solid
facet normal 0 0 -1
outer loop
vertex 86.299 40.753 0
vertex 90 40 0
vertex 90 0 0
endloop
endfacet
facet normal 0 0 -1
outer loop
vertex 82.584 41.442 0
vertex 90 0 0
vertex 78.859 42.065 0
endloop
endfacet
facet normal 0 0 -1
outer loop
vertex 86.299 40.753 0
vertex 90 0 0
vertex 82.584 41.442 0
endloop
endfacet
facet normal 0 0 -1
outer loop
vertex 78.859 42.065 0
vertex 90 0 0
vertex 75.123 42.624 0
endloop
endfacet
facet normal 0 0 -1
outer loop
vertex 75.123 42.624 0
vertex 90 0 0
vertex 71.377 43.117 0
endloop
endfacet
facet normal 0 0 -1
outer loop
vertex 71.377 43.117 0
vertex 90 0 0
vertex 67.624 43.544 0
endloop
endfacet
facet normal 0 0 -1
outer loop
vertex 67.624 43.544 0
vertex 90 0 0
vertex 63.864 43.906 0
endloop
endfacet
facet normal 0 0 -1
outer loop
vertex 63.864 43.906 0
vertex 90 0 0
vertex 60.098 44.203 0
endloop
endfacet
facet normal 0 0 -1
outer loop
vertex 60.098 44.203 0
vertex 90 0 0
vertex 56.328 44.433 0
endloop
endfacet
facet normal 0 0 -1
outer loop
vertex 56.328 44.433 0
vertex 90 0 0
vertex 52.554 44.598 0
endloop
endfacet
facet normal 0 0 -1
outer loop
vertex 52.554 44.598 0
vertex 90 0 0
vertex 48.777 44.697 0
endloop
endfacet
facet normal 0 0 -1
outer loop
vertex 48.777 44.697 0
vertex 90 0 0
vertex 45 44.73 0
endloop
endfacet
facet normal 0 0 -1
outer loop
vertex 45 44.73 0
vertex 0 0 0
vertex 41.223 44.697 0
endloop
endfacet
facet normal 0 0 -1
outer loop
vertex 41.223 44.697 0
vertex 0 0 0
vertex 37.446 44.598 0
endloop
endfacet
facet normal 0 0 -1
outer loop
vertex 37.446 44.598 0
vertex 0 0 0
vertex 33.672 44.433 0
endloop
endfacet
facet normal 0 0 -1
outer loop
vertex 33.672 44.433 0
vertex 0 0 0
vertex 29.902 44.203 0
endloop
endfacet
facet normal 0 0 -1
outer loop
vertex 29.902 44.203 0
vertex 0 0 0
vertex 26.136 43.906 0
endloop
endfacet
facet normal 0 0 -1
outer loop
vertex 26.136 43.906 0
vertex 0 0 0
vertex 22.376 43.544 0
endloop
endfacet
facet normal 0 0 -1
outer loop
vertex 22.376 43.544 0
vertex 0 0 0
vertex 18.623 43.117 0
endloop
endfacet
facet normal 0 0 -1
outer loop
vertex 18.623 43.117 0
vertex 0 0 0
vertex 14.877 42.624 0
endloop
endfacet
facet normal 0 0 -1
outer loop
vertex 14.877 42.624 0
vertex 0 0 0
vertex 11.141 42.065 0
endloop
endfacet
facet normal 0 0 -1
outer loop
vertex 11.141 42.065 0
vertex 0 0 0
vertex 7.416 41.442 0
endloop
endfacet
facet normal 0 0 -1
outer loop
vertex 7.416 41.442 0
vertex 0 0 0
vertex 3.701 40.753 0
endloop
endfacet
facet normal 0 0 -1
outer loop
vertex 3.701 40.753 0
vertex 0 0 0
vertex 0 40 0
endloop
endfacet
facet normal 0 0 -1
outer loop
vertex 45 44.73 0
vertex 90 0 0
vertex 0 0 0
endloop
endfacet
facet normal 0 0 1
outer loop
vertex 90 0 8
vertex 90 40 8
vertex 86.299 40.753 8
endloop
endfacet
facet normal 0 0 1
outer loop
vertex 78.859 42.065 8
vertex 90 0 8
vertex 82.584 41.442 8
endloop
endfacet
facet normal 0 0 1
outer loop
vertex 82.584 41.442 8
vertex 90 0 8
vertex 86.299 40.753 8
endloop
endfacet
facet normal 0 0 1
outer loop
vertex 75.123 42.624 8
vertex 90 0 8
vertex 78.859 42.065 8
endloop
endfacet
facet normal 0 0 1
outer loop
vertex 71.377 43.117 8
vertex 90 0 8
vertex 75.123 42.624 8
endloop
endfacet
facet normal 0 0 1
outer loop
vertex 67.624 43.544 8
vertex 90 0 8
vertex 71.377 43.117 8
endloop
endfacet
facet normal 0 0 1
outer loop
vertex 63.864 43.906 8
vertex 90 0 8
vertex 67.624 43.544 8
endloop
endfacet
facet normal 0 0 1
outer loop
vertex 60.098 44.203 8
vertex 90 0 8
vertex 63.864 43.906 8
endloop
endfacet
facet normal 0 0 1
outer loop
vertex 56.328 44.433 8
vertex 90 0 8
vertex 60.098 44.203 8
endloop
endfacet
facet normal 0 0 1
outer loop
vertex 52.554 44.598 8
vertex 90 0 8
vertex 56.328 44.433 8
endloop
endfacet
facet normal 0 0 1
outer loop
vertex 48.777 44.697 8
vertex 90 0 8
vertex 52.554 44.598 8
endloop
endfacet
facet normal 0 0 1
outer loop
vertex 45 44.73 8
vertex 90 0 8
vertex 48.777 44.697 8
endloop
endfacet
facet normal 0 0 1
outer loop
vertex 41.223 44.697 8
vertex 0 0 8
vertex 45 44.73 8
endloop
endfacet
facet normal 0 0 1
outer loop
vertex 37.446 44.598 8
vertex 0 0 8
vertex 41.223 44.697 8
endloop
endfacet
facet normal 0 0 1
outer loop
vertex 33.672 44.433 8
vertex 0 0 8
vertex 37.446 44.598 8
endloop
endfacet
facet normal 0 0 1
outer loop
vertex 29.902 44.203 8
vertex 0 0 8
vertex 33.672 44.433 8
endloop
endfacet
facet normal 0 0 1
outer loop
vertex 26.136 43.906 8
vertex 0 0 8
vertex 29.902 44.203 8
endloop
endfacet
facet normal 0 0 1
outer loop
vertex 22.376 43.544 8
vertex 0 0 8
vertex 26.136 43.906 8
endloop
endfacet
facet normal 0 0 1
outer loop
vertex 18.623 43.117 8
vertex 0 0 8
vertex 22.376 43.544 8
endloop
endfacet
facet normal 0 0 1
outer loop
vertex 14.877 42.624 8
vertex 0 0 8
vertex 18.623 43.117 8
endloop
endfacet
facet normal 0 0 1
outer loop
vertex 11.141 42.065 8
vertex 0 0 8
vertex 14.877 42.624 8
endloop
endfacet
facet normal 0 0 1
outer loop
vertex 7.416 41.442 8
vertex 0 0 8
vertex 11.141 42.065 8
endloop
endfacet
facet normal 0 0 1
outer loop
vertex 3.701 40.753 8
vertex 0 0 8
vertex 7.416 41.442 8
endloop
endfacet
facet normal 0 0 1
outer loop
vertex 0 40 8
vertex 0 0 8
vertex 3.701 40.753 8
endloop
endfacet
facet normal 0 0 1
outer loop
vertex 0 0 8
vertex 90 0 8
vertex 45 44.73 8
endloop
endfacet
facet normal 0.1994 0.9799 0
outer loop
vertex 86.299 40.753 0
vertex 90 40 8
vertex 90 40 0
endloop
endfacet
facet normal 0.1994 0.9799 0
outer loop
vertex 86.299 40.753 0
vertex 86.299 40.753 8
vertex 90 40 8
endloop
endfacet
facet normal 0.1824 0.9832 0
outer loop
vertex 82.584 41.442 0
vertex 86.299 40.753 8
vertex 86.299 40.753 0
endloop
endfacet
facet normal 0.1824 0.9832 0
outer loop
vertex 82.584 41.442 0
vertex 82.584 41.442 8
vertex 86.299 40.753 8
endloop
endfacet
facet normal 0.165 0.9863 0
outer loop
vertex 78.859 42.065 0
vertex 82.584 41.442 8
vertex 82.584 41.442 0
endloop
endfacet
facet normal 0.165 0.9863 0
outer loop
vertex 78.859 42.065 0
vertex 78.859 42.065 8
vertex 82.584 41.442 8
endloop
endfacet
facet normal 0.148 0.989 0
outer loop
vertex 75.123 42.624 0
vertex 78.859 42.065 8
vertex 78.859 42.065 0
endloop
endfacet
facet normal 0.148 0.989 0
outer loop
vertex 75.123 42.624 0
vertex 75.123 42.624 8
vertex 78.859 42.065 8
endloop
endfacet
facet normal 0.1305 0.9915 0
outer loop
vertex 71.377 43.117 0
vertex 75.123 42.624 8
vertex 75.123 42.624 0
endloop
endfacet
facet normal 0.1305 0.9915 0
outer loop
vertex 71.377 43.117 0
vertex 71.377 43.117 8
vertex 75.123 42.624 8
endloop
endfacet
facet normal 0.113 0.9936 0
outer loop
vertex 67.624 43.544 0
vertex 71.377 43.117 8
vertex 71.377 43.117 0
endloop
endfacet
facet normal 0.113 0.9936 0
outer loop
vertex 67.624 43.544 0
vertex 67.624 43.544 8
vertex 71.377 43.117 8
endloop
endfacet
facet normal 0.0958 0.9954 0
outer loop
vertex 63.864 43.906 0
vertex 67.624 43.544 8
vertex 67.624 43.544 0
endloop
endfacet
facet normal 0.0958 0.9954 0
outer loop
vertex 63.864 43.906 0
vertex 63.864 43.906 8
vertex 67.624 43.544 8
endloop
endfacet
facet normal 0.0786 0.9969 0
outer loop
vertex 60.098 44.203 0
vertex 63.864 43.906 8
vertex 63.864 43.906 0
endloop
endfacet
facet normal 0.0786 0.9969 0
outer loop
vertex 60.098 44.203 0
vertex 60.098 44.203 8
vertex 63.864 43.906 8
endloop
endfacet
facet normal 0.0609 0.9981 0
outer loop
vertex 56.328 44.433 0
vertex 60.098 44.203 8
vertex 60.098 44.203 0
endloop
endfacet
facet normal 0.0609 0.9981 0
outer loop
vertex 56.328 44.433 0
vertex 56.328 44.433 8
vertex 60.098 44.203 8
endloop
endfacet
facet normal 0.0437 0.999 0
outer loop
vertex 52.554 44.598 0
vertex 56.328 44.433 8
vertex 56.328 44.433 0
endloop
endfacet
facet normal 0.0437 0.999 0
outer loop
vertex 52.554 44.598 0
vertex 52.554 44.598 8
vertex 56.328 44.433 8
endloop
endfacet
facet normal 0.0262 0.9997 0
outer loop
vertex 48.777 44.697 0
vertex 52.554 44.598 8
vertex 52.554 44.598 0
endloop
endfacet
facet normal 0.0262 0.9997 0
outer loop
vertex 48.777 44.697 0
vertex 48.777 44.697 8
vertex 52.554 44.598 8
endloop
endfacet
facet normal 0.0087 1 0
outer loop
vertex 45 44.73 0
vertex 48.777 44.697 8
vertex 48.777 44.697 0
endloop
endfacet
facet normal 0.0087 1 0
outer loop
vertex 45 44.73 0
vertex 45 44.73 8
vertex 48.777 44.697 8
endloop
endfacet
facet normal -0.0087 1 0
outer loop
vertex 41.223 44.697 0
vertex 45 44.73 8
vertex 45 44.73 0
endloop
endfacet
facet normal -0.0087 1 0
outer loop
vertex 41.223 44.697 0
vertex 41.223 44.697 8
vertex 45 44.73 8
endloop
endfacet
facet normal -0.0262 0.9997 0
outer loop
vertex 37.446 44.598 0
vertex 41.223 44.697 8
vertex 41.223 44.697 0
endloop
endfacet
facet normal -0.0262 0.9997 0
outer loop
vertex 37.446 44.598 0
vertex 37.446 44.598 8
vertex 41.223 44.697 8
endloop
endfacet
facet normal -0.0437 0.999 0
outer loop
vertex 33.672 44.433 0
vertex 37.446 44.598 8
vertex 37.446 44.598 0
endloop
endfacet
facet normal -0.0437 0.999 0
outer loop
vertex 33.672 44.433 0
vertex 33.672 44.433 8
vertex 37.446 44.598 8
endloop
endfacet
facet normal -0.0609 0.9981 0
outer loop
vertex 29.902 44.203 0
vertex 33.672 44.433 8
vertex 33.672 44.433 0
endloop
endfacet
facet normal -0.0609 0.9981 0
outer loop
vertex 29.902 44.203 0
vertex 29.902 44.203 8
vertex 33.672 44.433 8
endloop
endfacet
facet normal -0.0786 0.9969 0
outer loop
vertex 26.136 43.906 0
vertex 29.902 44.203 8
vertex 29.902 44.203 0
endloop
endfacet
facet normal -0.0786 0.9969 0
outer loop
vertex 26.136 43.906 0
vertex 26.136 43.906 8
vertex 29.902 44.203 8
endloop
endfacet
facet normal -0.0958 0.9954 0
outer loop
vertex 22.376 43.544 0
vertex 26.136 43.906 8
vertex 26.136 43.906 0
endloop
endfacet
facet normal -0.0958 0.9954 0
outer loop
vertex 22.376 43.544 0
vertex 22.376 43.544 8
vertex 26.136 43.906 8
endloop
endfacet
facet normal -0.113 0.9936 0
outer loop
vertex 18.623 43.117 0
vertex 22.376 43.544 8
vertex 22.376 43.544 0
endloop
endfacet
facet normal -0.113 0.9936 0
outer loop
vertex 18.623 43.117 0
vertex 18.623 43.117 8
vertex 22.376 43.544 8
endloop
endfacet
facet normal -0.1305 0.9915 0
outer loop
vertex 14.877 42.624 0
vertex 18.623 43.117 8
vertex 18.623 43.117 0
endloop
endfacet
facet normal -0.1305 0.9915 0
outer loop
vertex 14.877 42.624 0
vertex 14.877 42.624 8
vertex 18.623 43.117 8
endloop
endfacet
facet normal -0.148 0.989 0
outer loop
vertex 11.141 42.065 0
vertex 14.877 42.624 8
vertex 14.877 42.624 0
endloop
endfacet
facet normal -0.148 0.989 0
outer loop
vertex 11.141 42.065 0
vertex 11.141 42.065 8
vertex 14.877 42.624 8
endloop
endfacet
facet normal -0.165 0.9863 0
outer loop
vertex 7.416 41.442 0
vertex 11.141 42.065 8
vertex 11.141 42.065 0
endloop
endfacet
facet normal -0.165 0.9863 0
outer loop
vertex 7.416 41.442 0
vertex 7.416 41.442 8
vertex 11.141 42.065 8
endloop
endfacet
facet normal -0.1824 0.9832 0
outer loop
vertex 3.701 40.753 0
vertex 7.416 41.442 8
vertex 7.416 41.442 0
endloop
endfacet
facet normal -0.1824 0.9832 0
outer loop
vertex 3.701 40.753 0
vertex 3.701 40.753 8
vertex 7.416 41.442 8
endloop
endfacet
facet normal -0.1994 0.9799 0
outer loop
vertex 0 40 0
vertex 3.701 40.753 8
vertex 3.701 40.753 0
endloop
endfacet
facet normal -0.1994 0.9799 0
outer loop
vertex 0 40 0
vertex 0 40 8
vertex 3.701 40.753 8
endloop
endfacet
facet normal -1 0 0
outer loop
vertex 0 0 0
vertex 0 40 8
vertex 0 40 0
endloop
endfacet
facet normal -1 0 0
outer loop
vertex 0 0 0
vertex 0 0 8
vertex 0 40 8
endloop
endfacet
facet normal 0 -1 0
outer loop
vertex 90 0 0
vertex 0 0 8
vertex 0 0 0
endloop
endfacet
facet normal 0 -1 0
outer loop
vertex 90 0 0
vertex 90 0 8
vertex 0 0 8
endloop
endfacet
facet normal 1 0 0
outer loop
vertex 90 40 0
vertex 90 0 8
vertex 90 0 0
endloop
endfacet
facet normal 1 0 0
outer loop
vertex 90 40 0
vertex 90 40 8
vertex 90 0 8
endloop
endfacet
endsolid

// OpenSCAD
$fn = 32;

// ----------------------------------------------------------------------
// Arc profile plate: crown, 27 points
// ----------------------------------------------------------------------

// --- parameters (mm) ---
bar_l = 90;               // bar length, X
bar_w = 40;               // bar height at the ends, Y
arc_r = 216.44;           // radius of the crown arc
arc_angle = 24;           // crown arc angle, degrees
crown_rise = 4.73;        // rise of the crown over the ends
arc_step = 1;             // sampling step of the crown arc, degrees
plate_t = 8;              // plate thickness, Z
fit_tol = 0.05;           // declared fit tolerance (prompt contract)
free_tol = 0.2;           // declared free tolerance (prompt contract)

bbox_y = bar_w + crown_rise;  // full height with the crown

profile = [[90, 40], [86.299, 40.753], [82.584, 41.442], [78.859, 42.065], [75.123, 42.624], [71.377, 43.117], [67.624, 43.544], [63.864, 43.906], [60.098, 44.203], [56.328, 44.433], [52.554, 44.598], [48.777, 44.697], [45, 44.73], [41.223, 44.697], [37.446, 44.598], [33.672, 44.433], [29.902, 44.203], [26.136, 43.906], [22.376, 43.544], [18.623, 43.117], [14.877, 42.624], [11.141, 42.065], [7.416, 41.442], [3.701, 40.753], [0, 40], [0, 0], [90, 0]];  // primary outline, 27 points, counter clockwise

// --- the one profile operation ---
linear_extrude(height = plate_t) polygon(points = profile);
